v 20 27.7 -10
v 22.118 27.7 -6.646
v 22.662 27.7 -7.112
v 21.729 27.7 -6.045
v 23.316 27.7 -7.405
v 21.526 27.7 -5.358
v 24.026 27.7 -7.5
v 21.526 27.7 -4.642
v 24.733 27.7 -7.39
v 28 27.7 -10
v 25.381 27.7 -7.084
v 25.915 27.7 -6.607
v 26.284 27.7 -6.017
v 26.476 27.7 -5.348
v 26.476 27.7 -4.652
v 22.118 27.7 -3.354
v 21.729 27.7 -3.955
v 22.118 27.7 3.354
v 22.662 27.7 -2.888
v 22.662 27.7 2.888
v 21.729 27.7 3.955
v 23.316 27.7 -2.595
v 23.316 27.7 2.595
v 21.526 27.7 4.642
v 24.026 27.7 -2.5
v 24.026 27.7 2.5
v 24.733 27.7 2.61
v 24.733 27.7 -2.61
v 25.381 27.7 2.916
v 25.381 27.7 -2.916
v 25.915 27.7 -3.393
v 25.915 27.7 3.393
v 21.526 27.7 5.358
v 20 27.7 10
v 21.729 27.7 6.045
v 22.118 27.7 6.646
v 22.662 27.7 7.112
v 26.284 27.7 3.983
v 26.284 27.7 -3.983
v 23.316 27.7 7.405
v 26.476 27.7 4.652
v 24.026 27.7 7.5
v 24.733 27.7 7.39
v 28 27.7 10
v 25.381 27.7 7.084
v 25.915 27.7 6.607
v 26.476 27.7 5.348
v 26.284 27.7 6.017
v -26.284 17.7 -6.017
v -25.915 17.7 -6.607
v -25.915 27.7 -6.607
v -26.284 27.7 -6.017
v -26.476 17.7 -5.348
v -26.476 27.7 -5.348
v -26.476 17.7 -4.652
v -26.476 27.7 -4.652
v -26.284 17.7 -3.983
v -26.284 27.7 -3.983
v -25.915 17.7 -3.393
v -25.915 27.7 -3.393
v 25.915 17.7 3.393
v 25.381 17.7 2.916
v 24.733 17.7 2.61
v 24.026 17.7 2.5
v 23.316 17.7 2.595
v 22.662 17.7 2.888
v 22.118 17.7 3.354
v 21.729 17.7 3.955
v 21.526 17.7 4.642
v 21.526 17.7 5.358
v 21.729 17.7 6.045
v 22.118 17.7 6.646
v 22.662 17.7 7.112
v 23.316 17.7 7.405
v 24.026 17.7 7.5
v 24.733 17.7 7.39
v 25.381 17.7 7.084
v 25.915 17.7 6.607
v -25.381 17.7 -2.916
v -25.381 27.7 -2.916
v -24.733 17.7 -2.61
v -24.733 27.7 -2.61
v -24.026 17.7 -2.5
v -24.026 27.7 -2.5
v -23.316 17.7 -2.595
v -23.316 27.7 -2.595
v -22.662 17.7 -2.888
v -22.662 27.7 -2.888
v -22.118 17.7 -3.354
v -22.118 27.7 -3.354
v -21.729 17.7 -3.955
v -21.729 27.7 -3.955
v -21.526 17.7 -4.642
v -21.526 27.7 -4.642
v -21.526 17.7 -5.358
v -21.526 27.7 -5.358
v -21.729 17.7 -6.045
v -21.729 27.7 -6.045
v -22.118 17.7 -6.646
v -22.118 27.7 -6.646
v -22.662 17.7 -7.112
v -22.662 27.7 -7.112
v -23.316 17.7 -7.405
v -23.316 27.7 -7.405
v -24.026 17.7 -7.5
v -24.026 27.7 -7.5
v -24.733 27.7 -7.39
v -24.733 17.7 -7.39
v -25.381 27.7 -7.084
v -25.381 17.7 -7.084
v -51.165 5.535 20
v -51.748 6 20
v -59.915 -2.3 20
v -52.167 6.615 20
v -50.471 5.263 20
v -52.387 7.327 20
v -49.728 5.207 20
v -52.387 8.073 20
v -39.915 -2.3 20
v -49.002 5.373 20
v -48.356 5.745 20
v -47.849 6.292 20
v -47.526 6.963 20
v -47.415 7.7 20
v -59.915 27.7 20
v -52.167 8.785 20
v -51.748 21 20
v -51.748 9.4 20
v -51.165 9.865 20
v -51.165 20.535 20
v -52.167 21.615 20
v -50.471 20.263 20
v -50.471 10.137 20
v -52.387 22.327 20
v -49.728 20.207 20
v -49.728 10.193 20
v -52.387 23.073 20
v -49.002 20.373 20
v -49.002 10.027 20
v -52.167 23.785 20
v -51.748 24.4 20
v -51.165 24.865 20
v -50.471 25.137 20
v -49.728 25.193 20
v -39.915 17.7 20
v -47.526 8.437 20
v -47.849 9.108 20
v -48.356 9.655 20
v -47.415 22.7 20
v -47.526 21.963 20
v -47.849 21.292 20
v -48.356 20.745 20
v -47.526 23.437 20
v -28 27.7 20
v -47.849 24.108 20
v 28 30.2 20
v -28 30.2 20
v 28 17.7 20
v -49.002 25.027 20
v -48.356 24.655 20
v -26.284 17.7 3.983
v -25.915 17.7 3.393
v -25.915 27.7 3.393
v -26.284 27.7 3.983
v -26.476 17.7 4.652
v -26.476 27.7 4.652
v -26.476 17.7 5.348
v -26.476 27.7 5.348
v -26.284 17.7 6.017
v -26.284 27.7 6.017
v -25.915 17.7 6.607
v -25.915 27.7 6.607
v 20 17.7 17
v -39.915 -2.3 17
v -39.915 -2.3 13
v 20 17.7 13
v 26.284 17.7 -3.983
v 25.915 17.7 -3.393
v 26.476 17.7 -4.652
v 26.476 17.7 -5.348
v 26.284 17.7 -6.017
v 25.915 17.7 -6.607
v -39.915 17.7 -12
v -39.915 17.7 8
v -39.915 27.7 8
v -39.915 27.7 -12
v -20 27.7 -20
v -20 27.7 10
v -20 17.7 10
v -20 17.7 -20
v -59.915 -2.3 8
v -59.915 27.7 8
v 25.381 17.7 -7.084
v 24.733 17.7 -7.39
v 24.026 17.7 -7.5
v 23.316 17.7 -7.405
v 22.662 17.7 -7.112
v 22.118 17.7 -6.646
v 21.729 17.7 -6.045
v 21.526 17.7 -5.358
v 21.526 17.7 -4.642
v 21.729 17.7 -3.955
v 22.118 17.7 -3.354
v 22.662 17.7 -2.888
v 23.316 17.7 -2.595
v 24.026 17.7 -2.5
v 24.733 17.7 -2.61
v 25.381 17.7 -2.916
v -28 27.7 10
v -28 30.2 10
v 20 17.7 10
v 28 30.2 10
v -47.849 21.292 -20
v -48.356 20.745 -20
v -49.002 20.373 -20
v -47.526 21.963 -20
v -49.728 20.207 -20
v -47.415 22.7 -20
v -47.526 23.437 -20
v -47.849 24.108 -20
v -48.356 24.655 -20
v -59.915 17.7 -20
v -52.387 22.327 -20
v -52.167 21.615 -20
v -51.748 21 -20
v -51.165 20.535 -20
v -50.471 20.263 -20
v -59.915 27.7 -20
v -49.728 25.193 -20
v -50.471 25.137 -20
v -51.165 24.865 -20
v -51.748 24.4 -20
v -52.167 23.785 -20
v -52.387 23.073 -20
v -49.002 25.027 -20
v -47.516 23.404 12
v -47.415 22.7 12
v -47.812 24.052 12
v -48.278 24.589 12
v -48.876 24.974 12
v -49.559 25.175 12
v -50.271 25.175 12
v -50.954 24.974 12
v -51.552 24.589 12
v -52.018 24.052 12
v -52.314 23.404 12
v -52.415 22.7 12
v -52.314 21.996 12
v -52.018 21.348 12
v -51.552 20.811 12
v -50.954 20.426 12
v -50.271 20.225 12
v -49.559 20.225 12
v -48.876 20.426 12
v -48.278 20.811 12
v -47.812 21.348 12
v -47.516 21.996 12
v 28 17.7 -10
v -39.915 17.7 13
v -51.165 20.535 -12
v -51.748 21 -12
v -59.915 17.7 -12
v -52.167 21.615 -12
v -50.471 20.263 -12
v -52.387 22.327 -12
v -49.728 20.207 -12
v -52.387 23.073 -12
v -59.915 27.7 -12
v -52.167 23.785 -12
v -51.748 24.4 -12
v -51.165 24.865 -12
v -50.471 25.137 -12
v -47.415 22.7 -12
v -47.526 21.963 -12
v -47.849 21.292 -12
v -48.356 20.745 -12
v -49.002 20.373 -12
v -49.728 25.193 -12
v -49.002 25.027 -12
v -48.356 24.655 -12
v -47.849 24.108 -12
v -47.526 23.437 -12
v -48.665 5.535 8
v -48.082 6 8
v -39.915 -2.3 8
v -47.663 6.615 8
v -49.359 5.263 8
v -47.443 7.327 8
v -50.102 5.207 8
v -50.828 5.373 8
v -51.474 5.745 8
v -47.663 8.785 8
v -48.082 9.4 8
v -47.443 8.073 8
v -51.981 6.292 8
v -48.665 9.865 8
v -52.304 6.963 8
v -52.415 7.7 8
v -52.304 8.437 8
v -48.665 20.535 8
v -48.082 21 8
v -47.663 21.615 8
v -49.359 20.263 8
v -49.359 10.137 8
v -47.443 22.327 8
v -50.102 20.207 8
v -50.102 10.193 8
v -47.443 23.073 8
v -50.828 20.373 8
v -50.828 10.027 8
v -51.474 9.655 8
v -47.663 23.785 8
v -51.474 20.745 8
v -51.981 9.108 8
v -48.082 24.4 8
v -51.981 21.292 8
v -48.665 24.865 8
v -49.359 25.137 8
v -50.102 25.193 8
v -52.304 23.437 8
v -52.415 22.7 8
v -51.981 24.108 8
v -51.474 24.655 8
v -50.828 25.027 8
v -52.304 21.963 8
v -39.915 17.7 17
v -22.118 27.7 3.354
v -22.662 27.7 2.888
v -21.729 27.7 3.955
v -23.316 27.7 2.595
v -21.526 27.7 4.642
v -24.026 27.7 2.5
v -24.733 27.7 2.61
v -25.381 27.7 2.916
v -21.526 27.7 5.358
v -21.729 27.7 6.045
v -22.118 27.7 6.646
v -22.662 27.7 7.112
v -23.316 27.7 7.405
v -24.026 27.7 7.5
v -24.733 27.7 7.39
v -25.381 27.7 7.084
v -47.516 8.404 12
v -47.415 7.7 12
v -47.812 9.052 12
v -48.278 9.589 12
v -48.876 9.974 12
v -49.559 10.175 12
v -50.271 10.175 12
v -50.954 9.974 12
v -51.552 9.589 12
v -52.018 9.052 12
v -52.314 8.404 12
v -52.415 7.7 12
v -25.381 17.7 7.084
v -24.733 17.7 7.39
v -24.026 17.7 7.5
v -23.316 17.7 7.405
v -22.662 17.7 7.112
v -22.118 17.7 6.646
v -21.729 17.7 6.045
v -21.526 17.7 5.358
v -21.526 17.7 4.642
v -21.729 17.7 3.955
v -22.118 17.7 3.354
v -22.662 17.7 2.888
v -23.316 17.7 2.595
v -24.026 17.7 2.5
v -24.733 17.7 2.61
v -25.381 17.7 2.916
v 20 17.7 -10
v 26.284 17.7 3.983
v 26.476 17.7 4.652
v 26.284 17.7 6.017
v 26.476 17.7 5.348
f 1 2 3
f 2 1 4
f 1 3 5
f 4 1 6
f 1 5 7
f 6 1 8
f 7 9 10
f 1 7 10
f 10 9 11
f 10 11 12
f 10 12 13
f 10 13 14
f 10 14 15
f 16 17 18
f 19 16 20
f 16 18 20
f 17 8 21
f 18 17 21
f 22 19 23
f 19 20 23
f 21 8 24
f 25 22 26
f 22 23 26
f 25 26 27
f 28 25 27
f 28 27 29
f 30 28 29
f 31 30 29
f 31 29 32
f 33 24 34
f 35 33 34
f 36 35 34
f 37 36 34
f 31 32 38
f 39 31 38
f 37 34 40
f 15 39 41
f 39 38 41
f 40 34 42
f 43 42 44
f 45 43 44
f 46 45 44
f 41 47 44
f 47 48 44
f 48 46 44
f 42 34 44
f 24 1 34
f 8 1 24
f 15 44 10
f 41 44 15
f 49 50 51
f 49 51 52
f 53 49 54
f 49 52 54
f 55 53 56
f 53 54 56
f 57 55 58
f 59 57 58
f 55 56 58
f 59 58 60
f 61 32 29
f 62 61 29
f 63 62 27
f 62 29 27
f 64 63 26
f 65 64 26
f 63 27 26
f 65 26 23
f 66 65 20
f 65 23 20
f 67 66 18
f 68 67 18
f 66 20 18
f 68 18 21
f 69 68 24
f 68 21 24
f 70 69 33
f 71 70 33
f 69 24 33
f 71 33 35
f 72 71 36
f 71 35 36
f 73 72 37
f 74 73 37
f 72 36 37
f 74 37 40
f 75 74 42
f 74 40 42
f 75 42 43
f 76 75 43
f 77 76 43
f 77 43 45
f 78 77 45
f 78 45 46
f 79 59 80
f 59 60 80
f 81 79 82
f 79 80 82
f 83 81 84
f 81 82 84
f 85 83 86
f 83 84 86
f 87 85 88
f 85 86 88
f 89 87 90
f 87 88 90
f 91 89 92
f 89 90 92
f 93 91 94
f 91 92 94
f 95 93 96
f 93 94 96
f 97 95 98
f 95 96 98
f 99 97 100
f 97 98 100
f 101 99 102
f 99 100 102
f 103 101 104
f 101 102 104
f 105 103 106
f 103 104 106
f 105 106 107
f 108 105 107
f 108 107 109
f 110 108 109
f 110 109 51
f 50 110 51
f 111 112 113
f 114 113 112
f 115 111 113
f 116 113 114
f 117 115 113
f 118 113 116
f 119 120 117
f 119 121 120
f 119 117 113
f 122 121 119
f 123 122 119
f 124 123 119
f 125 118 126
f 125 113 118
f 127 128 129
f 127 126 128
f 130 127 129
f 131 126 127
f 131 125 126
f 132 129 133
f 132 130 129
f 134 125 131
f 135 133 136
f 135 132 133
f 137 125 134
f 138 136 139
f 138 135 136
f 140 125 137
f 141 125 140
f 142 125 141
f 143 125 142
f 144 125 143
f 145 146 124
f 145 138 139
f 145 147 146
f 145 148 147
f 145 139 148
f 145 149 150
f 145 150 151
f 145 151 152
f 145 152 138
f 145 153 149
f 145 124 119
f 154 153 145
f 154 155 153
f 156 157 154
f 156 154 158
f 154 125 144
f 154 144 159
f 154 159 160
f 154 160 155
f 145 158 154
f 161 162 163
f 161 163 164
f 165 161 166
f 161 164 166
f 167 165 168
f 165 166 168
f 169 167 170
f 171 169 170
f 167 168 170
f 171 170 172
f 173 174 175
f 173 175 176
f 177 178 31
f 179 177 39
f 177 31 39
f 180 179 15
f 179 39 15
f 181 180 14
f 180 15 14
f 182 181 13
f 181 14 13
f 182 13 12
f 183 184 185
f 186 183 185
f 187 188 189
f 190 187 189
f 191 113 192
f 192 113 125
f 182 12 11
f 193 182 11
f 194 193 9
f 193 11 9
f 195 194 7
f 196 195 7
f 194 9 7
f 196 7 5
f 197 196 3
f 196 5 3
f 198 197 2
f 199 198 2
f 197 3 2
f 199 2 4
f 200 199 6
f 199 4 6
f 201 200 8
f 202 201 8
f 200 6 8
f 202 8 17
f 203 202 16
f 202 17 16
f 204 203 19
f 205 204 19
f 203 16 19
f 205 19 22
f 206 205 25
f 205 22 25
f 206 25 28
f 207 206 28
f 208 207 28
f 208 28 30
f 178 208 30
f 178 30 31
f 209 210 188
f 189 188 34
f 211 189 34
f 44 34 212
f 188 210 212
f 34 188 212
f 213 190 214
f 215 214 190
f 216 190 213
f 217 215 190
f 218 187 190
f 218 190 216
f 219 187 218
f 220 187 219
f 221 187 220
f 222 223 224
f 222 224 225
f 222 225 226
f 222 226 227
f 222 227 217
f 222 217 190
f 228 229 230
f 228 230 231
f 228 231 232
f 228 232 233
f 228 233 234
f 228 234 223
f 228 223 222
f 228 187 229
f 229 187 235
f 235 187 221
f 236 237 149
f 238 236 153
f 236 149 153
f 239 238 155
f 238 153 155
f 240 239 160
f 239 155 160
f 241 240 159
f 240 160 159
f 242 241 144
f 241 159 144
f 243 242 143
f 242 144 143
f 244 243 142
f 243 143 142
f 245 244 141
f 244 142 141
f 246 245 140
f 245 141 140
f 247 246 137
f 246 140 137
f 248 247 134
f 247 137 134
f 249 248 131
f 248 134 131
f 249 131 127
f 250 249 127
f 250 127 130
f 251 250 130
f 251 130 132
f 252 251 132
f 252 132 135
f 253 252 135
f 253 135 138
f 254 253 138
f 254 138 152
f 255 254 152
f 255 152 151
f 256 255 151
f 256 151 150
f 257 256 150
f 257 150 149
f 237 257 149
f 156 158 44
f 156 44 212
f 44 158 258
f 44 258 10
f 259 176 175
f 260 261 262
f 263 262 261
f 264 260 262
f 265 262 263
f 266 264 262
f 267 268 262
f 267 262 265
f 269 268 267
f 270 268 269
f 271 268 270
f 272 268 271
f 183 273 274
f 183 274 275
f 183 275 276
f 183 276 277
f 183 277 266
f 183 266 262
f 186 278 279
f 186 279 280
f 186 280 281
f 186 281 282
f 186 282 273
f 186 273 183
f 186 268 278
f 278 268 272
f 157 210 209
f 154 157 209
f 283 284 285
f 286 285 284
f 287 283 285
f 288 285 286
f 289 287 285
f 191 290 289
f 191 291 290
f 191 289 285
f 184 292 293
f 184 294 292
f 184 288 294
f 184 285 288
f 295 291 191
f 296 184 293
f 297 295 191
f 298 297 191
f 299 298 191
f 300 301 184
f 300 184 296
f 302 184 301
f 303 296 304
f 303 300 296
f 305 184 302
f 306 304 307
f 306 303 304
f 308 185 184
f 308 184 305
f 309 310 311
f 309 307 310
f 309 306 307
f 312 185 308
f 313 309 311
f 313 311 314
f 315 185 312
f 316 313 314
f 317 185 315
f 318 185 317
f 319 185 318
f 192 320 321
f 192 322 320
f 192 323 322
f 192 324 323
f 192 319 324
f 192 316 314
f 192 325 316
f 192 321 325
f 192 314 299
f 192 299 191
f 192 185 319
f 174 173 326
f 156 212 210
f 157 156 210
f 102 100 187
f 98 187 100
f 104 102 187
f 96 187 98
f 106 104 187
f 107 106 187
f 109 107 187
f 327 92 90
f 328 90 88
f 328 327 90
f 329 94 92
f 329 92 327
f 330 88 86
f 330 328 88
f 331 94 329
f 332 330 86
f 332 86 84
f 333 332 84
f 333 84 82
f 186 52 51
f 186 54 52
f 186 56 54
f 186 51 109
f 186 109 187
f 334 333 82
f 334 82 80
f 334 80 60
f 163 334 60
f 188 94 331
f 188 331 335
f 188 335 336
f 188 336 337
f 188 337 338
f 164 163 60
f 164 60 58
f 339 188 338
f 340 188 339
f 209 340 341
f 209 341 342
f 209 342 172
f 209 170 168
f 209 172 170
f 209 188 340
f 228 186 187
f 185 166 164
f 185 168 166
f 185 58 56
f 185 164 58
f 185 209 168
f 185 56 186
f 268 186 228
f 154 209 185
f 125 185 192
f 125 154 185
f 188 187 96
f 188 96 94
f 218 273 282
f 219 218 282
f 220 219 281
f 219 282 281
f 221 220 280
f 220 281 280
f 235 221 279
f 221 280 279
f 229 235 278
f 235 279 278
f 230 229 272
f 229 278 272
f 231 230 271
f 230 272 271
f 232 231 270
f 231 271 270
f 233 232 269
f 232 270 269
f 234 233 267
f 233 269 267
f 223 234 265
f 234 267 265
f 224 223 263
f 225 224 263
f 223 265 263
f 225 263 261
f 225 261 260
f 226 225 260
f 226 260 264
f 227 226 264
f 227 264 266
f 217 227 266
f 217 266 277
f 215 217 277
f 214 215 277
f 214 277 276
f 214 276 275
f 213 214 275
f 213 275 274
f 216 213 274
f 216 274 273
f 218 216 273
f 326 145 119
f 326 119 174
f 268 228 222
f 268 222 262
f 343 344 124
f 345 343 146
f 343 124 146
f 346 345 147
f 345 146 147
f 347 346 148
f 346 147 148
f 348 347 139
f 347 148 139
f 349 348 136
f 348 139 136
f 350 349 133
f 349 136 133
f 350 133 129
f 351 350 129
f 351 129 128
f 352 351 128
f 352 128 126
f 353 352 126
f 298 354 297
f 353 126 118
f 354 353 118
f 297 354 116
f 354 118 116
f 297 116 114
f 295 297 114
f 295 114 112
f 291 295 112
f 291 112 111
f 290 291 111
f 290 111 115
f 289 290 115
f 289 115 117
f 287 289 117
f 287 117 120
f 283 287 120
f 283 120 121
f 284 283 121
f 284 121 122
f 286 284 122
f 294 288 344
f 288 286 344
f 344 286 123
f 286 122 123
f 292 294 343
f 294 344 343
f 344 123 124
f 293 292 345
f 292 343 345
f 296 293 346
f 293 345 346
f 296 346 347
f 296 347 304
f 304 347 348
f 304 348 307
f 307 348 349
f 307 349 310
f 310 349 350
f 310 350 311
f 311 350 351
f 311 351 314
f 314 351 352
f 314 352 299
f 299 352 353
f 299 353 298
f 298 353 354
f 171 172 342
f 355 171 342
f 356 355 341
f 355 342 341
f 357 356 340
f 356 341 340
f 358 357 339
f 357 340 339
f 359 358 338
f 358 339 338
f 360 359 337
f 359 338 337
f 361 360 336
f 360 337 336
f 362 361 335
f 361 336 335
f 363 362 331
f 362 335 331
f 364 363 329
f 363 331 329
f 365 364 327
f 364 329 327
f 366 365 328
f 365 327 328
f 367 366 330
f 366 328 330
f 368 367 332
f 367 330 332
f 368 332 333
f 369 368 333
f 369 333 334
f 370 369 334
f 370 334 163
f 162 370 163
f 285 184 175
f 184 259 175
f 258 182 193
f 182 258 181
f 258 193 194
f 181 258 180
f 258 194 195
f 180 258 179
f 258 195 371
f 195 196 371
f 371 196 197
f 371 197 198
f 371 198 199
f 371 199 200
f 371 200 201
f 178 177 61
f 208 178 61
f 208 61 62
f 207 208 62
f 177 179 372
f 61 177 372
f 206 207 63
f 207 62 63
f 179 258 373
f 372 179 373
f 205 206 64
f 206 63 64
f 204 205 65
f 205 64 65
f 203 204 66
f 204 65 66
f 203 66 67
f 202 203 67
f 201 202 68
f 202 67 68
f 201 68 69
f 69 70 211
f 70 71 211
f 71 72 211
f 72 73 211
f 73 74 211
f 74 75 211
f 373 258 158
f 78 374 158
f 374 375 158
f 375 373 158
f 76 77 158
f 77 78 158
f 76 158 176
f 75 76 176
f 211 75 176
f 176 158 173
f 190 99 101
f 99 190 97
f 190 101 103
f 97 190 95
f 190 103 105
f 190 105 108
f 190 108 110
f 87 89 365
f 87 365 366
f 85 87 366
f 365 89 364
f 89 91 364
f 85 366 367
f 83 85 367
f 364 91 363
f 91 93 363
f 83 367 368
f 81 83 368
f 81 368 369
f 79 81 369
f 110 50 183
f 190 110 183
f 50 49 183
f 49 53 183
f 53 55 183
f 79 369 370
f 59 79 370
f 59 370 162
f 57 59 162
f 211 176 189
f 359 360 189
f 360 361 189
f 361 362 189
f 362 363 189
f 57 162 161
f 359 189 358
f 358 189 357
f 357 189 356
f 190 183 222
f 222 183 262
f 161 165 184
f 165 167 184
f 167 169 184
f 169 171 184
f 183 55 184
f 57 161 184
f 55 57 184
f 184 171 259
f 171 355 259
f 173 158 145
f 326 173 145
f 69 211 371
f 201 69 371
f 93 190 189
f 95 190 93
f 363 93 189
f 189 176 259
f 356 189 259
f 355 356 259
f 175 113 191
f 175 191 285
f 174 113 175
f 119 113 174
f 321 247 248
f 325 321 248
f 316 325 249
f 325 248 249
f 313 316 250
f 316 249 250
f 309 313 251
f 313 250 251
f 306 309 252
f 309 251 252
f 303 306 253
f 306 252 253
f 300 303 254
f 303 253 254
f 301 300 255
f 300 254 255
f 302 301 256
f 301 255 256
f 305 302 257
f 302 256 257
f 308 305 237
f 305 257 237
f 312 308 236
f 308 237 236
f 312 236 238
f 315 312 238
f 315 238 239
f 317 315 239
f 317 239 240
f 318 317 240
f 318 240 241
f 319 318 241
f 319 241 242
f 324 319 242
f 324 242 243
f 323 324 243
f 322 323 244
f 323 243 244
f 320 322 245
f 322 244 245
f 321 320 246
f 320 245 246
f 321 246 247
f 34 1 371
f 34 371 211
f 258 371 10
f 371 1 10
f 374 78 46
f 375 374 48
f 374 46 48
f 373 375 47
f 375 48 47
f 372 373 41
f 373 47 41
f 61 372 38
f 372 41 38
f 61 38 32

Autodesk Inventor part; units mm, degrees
ref_plane "Work Plane1" through (-26, 27.7, 10) normal (0, -1, 0) x (1, 0, 0)
sketch "Sketch1" plane through (-26, 27.7, 10) normal (0, -1, 0) x (1, 0, 0)
  line L0 (6, -0.5) -> (6, 0)
  line L1 (0, 0) -> (6.5, 0) projected
  line L2 (6, 0) -> (0, 0)
  line L3 (0, 0) -> (-2, 0)
  arc A0 (0, 0) -> (-2, -2) centre (0, -2) ccw projected
  line L4 (-2, 0) -> (-2, 0)
  line L5 (0, 0) -> (-2, 0)
  line L6 (-2, -2) -> (-2, -3.75) projected
  line L7 (-2, -2) -> (-2, 0)
  arc A1 (0, 0) -> (-2, -2) centre (0, -2) ccw projected
  line L8 (0, 0) -> (-2, 0)
  arc A2 (-2, -18) -> (0, -20) centre (0, -18) ccw projected
  line L9 (-2, -2) -> (-2, -18)
  line L10 (-2, -18) -> (-2, -20)
  line L11 (-2, -20) -> (0, -20)
  line L12 (0, -20) -> (6.5, -20)
  line L13 (6, -19.5) -> (6, -20)
  line L14 (6, -19.5) -> (6, -0.5)
  point P0 (26, -10)
extrude "Extrusion1" add sketch "Sketch1" along normal blind 10
ref_plane "Work Plane3" through (19.5, 27.7, -10) normal (0, -1, 0) x (1, 0, 0)
sketch "Sketch2" plane through (19.5, 27.7, -10) normal (0, -1, 0) x (1, 0, 0)
  line L0 (0.5, 19.5) -> (0.5, 0.5) projected
  line L1 (0.5, 19.5) -> (0.5, 20)
  line L2 (0, 20) -> (6.5, 20) projected
  line L3 (0.5, 0.4979) -> (0.5, -0.0021)
  arc A0 (6.5, 0) -> (8.5, 2) centre (6.5, 2) ccw projected
  line L4 (0, 0) -> (6.5, 0) projected
  line L5 (8.5, 2) -> (6.5, 2)
  line L6 (6.5, 2) -> (6.5, 0)
  line L7 (6.5, 0) -> (8.5, 0)
  line L8 (8.5, 0) -> (8.5, 2)
  line L9 (0.5, 20) -> (8.5, 20)
  line L10 (8.5, 20) -> (8.5, 0)
  line L11 (8.5, 0) -> (0.5, 0)
  line L12 (0.5, 0) -> (0.5, 20)
  point P0 (-19.5, 10)
  point P1 (0.5, 0.5)
  dimension "d4" = 0.5
extrude "Extrusion2" add sketch "Sketch2" along normal blind 10
ref_plane "Work Plane5" through (-19.5, 27.7, 10) normal (0, 0, 1) x (1, 0, 0)
sketch "Sketch3" plane through (-19.5, 27.7, 10) normal (0, 0, 1) x (1, 0, 0)
  line L0 (-8.5, 0) -> (-8.5, -10) projected
  line L1 (47.5, 0) -> (47.5, 2.5) projected
  line L2 (-8.5, -10) -> (47.5, -10)
  line L3 (47.5, -10) -> (47.5, 2.5)
  line L4 (47.5, 2.5) -> (-8.5, 2.5)
  line L5 (-8.5, 2.5) -> (-8.5, -10)
  point P0 (19.5, -27.7)
extrude "Extrusion3" add sketch "Sketch3" along normal blind 10
ref_plane "Work Plane4" through (19.5, 27.7, -10) normal (0, 1, 0) x (1, 0, 0)
sketch "Sketch4" plane through (19.5, 27.7, -10) normal (0, 1, 0) x (1, 0, 0)
  arc A0 (6.415, -13.3929) -> (6.415, -16.6071) centre (4.5, -15) ccw projected
  circle A1 centre (4.5, -15) radius 2.5
  arc A2 (6.415, -3.3929) -> (6.415, -6.6071) centre (4.5, -5) ccw projected
  circle A3 centre (4.5, -5) radius 2.5
  arc A4 (-45.415, -16.6071) -> (-45.415, -13.3929) centre (-43.5, -15) ccw projected
  circle A5 centre (-43.5, -15) radius 2.5
  arc A6 (-45.415, -6.6071) -> (-45.415, -3.3929) centre (-43.5, -5) ccw projected
  circle A7 centre (-43.5, -5) radius 2.5
  point P0 (-19.5, -10)
  point P1 (6.415, -3.3929)
  point P2 (6.415, -13.3929)
  point P3 (-45.415, -16.6071)
  point P4 (-45.415, -6.6071)
extrude "Extrusion4" cut sketch "Sketch4" against normal blind 10
ref_plane "Work Plane6" through (-28, 30.2, -3.75) normal (-1, 0, 0) x (0, 0, 1)
sketch "Sketch5" plane through (-28, 30.2, -3.75) normal (-1, 0, 0) x (0, 0, 1)
  line L0 (-6.25, -12.5) -> (23.75, -12.5) projected
  line L1 (-6.25, -2.5) -> (-6.25, -12.5) projected
  line L2 (23.75, -12.5) -> (-6.25, -12.5)
  line L3 (-6.25, -12.5) -> (-6.25, -2.5)
  line L4 (-6.25, -2.5) -> (23.75, -2.5)
  line L5 (23.75, -2.5) -> (23.75, -12.5)
  point P0 (3.75, -30.2)
extrude "Extrusion5" add sketch "Sketch5" along normal blind 11.915
ref_plane "Work Plane7" through (19.5, 27.7, -10) normal (0, 0, -1) x (-1, 0, 0)
sketch "Sketch6" plane through (19.5, 27.7, -10) normal (0, 0, -1) x (-1, 0, 0)
  line L0 (39.5, 0) -> (39.5, -10) projected
  line L1 (47.5, 0) -> (59.415, 0) projected
  line L2 (39.5, -10) -> (59.415, -10)
  line L3 (59.415, -10) -> (59.415, 0)
  line L4 (59.415, 0) -> (39.5, 0)
  line L5 (39.5, 0) -> (39.5, -10)
  point P0 (19.5, -27.7)
extrude "Extrusion6" add sketch "Sketch6" along normal blind 10
ref_plane "Work Plane8" through (-39.915, 30.2, -3.75) normal (-1, 0, 0) x (0, 0, 1)
sketch "Sketch7" plane through (-39.915, 30.2, -3.75) normal (-1, 0, 0) x (0, 0, 1)
  line L0 (-16.25, -12.5) -> (-16.25, -2.5) projected
  line L1 (-16.25, -12.5) -> (-6.25, -12.5)
  line L2 (-6.25, -12.5) -> (-6.25, -2.5)
  line L3 (-6.25, -2.5) -> (-16.25, -2.5)
  line L4 (-16.25, -2.5) -> (-16.25, -12.5)
  line L5 (23.75, -12.5) -> (23.75, -2.5) projected
  line L6 (23.75, -2.5) -> (13.75, -2.5)
  line L7 (13.75, -2.5) -> (13.75, -12.5)
  line L8 (13.75, -12.5) -> (23.75, -12.5)
  line L9 (23.75, -12.5) -> (23.75, -2.5)
  point P0 (3.75, -30.2)
  point P1 (23.75, -12.5)
  dimension "d15" = 10
  dimension "d16" = 10
extrude "Extrusion7" add sketch "Sketch7" along normal blind 20
ref_plane "Work Plane9" through (19.5, 27.7, -20) normal (0, 0, -1) x (-1, 0, 0)
sketch "Sketch9" plane through (-26, 17.7, 10) normal (0, -1, 0) x (1, 0, 0)
  line L0 (-13.915, 0) -> (-33.915, 0) projected
  line L1 (-13.915, 0) -> (-33.915, 0)
  line L2 (-33.915, 0) -> (-33.915, 10)
  line L3 (-33.915, 10) -> (-13.915, 10)
  line L4 (-13.915, 10) -> (-13.915, 0)
  point P0 (26, -10)
  point P1 (-33.915, 0)
extrude "Extrusion9" add sketch "Sketch9" along normal blind 20
ref_plane "Work Plane2" through (-39.915, 27.7, 15) normal (0, 0, -1) x (-1, 0, 0)
sketch "Sketch10" plane through (-39.915, 27.7, 15) normal (0, 0, -1) x (-1, 0, 0)
  line L0 (20, -30) -> (0, -30) projected
  line L1 (-59.915, -10) -> (-67.915, -10) projected
  line L2 (0, -30) -> (-59.915, -10)
  line L3 (0, -30) -> (0, -10)
  line L4 (0, -10) -> (-59.915, -10)
  point P0 (-39.915, -27.7)
extrude "Extrusion10" add sketch "Sketch10" along normal mid plane 4
ref_plane "Work Plane10" through (-19.5, 27.7, 20) normal (0, 0, 1) x (1, 0, 0)
thread "Thread1" size "M5x0.8" class "6H" standard "ANSI Metric M Profile" length 15
thread "Thread2" size "M5x0.8" class "6H" standard "ANSI Metric M Profile" length 15
thread "Thread3" size "M5x0.8" class "6H" standard "ANSI Metric M Profile" length 15
thread "Thread4" size "M5x0.8" class "6H" standard "ANSI Metric M Profile" length 15
sketch "Sketch13" plane through (-19.5, 27.7, 20) normal (0, 0, 1) x (1, 0, 0)
  line L0 (-20.415, -10) -> (-20.415, 0) projected
  line L1 (-20.415, 0) -> (-30.415, 0)
  line L2 (-20.415, 0) -> (-40.415, 0) projected
  line L3 (-30.415, 0) -> (-30.415, -5)
  line L4 (-20.415, -10) -> (-20.415, -30) projected
  line L5 (-20.415, -30) -> (-20.415, -20)
  line L6 (-20.415, -20) -> (-30.415, -20)
  circle A0 centre (-30.415, -5) radius 2.5
  circle A1 centre (-30.415, -20) radius 2.5
  point P0 (19.5, -27.7)
  dimension "d40" = 10
  dimension "d41" = 5
  dimension "d42" = 10
  dimension "d43" = 10
  dimension "d44" = 5
  dimension "d45" = 5
extrude "Extrusion12" cut sketch "Sketch13" against normal through all
sketch "Sketch14" plane through (-59.915, 27.7, -10) normal (0, 0, 1) x (1, 0, 0)
  line L0 (20, 0) -> (20, -10) projected
  line L1 (0, -10) -> (0, 0) projected
  line L2 (20, 0) -> (0, 0)
  line L3 (0, 0) -> (0, -10)
  line L4 (0, -10) -> (20, -10)
  line L5 (20, -10) -> (20, 0)
  point P0 (59.915, -27.7)
  point P1 (20, -10)
extrude "Extrusion13" add sketch "Sketch14" against normal blind 2
sketch "Sketch15" plane through (-39.915, 27.7, 10) normal (0, 0, -1) x (-1, 0, 0)
  line L0 (20, -30) -> (0, -30) projected
  line L1 (20, 0) -> (0, 0)
  line L2 (0, 0) -> (0, -30)
  line L3 (0, -30) -> (20, -30)
  line L4 (20, -30) -> (20, 0)
  point P0 (-39.915, -27.7)
extrude "Extrusion14" cut sketch "Sketch15" against normal blind 2
sketch "Sketch16" plane through (-39.915, 27.7, 12) normal (0, 0, -1) x (-1, 0, 0)
  line L0 (-11.915, 0) -> (20, 0) projected
  line L1 (20, -30) -> (0, -30) projected
  line L2 (20, 0) -> (0, 0)
  line L3 (0, 0) -> (0, -30)
  line L4 (0, -30) -> (20, -30)
  line L5 (20, -30) -> (20, 0)
  circle A0 centre (10, -20) radius 2.5 projected
  circle A1 centre (10, -20) radius 2.5
  circle A2 centre (10, -5) radius 2.5 projected
  circle A3 centre (10, -5) radius 2.5
  point P0 (-39.915, -27.7)
  point P1 (0, 0)
extrude "Extrusion15" add sketch "Sketch16" along normal blind 4
sketch "Sketch17" plane through (-49.915, 22.7, -12) normal (0, 0, -1) x (-1, 0, 0)
  circle A0 centre (0, 0) radius 2.5
  point P0 (-49.915, -22.7)
extrude "Extrusion16" cut sketch "Sketch17" against normal blind 4
sketch "Sketch18" plane through (-59.915, 27.7, -10) normal (0, 0, 1) x (1, 0, 0)
  line L0 (0, -10) -> (0, 0) projected
  line L1 (20, 0) -> (0, 0) projected
  line L2 (0, -10) -> (20, -10)
  line L3 (20, -10) -> (20, 0)
  line L4 (20, 0) -> (0, 0)
  line L5 (0, 0) -> (0, -10)
  point P0 (59.915, -27.7)
extrude "Extrusion17" cut sketch "Sketch18" against normal blind 2
properties part number "servo_holder" material "PET Plastic"
